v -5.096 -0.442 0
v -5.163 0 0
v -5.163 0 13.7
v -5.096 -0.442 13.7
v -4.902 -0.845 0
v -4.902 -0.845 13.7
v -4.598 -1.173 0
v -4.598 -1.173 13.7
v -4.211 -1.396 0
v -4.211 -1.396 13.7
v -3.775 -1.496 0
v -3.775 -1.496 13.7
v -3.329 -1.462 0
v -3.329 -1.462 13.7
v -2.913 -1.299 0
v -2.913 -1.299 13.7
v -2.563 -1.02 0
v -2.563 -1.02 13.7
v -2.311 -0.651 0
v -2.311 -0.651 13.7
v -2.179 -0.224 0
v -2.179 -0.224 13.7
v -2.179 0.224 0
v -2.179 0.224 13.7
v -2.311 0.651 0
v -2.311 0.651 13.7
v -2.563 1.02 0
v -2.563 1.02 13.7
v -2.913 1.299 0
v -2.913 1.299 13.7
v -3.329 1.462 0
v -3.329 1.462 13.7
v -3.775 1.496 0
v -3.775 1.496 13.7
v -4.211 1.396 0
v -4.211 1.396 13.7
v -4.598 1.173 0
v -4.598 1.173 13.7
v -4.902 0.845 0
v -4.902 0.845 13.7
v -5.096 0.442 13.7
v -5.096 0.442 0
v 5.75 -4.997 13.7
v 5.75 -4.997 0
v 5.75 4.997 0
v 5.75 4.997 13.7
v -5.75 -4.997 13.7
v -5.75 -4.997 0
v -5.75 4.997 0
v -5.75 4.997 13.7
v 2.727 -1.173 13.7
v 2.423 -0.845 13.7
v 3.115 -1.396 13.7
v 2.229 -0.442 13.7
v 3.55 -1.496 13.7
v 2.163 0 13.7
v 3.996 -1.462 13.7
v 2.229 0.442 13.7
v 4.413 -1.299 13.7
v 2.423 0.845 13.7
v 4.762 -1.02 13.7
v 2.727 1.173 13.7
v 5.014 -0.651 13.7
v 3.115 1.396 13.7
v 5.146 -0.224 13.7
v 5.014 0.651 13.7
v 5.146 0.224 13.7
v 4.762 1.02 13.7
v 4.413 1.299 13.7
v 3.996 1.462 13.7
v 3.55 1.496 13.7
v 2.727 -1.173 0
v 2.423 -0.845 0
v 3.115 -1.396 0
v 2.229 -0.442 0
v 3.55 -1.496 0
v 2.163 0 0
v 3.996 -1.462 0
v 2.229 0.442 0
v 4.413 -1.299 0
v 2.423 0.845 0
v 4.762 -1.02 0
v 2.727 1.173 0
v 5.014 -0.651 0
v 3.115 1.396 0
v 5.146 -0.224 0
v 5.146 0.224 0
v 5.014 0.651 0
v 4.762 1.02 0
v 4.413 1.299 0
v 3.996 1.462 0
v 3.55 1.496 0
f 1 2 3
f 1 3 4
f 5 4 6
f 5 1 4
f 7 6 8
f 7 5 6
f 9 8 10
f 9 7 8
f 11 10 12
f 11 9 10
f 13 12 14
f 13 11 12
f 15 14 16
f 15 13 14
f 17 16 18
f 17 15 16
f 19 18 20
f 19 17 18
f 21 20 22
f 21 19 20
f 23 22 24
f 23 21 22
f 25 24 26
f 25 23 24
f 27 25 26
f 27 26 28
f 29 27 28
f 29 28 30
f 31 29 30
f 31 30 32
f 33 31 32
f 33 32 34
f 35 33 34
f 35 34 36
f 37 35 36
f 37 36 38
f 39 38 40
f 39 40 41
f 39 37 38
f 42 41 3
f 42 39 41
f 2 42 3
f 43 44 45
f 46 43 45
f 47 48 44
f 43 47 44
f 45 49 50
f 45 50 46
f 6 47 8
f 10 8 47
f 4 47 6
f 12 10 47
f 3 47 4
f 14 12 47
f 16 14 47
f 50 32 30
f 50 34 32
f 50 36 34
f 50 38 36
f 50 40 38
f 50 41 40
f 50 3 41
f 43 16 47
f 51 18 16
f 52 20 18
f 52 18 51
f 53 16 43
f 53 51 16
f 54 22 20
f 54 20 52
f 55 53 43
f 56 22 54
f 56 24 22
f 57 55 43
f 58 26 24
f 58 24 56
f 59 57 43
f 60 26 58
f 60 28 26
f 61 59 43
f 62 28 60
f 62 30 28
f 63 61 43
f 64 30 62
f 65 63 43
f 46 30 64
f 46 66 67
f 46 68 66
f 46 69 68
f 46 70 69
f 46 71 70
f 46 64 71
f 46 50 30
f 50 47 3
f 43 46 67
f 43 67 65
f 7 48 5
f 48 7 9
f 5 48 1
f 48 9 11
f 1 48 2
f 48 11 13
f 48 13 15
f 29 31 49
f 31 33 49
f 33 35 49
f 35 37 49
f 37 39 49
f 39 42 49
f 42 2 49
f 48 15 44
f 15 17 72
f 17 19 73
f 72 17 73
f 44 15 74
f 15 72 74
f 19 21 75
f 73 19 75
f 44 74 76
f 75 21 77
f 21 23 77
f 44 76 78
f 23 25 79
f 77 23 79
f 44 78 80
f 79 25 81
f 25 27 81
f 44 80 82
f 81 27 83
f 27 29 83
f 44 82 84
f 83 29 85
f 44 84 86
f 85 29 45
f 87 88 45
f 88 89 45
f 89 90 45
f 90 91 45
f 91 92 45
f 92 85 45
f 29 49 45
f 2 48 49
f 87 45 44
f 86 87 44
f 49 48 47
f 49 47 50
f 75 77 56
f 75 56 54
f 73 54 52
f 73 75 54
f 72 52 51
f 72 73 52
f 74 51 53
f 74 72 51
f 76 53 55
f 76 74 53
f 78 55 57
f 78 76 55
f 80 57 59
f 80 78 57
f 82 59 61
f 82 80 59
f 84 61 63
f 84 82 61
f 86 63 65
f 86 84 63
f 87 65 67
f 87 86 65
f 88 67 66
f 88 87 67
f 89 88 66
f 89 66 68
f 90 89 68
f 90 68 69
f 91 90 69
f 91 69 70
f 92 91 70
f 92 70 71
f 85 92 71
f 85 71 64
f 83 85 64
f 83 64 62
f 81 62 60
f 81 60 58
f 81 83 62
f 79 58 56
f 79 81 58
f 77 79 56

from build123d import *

# Parameters (mm, degrees)
SKETCH3_W           = 11.5
SKETCH3_H           = 9.994310106
SKETCH3_R           = 1.5
BOSS_EXTRUDE2_DEPTH = 13.7


with BuildPart() as part:
    # Sketch3 → Boss-Extrude2 (new body)
    with BuildSketch(Plane.XY):
        Rectangle(SKETCH3_W, SKETCH3_H)
        with Locations(Location((3.662514997, 0, 0), (0, 0, 180))):
            Circle(SKETCH3_R, mode=Mode.SUBTRACT)
        with Locations(Location((-3.662514997, 0, 0), (0, 0, 180))):
            Circle(SKETCH3_R, mode=Mode.SUBTRACT)
    extrude(amount=BOSS_EXTRUDE2_DEPTH)


solid = part.part
